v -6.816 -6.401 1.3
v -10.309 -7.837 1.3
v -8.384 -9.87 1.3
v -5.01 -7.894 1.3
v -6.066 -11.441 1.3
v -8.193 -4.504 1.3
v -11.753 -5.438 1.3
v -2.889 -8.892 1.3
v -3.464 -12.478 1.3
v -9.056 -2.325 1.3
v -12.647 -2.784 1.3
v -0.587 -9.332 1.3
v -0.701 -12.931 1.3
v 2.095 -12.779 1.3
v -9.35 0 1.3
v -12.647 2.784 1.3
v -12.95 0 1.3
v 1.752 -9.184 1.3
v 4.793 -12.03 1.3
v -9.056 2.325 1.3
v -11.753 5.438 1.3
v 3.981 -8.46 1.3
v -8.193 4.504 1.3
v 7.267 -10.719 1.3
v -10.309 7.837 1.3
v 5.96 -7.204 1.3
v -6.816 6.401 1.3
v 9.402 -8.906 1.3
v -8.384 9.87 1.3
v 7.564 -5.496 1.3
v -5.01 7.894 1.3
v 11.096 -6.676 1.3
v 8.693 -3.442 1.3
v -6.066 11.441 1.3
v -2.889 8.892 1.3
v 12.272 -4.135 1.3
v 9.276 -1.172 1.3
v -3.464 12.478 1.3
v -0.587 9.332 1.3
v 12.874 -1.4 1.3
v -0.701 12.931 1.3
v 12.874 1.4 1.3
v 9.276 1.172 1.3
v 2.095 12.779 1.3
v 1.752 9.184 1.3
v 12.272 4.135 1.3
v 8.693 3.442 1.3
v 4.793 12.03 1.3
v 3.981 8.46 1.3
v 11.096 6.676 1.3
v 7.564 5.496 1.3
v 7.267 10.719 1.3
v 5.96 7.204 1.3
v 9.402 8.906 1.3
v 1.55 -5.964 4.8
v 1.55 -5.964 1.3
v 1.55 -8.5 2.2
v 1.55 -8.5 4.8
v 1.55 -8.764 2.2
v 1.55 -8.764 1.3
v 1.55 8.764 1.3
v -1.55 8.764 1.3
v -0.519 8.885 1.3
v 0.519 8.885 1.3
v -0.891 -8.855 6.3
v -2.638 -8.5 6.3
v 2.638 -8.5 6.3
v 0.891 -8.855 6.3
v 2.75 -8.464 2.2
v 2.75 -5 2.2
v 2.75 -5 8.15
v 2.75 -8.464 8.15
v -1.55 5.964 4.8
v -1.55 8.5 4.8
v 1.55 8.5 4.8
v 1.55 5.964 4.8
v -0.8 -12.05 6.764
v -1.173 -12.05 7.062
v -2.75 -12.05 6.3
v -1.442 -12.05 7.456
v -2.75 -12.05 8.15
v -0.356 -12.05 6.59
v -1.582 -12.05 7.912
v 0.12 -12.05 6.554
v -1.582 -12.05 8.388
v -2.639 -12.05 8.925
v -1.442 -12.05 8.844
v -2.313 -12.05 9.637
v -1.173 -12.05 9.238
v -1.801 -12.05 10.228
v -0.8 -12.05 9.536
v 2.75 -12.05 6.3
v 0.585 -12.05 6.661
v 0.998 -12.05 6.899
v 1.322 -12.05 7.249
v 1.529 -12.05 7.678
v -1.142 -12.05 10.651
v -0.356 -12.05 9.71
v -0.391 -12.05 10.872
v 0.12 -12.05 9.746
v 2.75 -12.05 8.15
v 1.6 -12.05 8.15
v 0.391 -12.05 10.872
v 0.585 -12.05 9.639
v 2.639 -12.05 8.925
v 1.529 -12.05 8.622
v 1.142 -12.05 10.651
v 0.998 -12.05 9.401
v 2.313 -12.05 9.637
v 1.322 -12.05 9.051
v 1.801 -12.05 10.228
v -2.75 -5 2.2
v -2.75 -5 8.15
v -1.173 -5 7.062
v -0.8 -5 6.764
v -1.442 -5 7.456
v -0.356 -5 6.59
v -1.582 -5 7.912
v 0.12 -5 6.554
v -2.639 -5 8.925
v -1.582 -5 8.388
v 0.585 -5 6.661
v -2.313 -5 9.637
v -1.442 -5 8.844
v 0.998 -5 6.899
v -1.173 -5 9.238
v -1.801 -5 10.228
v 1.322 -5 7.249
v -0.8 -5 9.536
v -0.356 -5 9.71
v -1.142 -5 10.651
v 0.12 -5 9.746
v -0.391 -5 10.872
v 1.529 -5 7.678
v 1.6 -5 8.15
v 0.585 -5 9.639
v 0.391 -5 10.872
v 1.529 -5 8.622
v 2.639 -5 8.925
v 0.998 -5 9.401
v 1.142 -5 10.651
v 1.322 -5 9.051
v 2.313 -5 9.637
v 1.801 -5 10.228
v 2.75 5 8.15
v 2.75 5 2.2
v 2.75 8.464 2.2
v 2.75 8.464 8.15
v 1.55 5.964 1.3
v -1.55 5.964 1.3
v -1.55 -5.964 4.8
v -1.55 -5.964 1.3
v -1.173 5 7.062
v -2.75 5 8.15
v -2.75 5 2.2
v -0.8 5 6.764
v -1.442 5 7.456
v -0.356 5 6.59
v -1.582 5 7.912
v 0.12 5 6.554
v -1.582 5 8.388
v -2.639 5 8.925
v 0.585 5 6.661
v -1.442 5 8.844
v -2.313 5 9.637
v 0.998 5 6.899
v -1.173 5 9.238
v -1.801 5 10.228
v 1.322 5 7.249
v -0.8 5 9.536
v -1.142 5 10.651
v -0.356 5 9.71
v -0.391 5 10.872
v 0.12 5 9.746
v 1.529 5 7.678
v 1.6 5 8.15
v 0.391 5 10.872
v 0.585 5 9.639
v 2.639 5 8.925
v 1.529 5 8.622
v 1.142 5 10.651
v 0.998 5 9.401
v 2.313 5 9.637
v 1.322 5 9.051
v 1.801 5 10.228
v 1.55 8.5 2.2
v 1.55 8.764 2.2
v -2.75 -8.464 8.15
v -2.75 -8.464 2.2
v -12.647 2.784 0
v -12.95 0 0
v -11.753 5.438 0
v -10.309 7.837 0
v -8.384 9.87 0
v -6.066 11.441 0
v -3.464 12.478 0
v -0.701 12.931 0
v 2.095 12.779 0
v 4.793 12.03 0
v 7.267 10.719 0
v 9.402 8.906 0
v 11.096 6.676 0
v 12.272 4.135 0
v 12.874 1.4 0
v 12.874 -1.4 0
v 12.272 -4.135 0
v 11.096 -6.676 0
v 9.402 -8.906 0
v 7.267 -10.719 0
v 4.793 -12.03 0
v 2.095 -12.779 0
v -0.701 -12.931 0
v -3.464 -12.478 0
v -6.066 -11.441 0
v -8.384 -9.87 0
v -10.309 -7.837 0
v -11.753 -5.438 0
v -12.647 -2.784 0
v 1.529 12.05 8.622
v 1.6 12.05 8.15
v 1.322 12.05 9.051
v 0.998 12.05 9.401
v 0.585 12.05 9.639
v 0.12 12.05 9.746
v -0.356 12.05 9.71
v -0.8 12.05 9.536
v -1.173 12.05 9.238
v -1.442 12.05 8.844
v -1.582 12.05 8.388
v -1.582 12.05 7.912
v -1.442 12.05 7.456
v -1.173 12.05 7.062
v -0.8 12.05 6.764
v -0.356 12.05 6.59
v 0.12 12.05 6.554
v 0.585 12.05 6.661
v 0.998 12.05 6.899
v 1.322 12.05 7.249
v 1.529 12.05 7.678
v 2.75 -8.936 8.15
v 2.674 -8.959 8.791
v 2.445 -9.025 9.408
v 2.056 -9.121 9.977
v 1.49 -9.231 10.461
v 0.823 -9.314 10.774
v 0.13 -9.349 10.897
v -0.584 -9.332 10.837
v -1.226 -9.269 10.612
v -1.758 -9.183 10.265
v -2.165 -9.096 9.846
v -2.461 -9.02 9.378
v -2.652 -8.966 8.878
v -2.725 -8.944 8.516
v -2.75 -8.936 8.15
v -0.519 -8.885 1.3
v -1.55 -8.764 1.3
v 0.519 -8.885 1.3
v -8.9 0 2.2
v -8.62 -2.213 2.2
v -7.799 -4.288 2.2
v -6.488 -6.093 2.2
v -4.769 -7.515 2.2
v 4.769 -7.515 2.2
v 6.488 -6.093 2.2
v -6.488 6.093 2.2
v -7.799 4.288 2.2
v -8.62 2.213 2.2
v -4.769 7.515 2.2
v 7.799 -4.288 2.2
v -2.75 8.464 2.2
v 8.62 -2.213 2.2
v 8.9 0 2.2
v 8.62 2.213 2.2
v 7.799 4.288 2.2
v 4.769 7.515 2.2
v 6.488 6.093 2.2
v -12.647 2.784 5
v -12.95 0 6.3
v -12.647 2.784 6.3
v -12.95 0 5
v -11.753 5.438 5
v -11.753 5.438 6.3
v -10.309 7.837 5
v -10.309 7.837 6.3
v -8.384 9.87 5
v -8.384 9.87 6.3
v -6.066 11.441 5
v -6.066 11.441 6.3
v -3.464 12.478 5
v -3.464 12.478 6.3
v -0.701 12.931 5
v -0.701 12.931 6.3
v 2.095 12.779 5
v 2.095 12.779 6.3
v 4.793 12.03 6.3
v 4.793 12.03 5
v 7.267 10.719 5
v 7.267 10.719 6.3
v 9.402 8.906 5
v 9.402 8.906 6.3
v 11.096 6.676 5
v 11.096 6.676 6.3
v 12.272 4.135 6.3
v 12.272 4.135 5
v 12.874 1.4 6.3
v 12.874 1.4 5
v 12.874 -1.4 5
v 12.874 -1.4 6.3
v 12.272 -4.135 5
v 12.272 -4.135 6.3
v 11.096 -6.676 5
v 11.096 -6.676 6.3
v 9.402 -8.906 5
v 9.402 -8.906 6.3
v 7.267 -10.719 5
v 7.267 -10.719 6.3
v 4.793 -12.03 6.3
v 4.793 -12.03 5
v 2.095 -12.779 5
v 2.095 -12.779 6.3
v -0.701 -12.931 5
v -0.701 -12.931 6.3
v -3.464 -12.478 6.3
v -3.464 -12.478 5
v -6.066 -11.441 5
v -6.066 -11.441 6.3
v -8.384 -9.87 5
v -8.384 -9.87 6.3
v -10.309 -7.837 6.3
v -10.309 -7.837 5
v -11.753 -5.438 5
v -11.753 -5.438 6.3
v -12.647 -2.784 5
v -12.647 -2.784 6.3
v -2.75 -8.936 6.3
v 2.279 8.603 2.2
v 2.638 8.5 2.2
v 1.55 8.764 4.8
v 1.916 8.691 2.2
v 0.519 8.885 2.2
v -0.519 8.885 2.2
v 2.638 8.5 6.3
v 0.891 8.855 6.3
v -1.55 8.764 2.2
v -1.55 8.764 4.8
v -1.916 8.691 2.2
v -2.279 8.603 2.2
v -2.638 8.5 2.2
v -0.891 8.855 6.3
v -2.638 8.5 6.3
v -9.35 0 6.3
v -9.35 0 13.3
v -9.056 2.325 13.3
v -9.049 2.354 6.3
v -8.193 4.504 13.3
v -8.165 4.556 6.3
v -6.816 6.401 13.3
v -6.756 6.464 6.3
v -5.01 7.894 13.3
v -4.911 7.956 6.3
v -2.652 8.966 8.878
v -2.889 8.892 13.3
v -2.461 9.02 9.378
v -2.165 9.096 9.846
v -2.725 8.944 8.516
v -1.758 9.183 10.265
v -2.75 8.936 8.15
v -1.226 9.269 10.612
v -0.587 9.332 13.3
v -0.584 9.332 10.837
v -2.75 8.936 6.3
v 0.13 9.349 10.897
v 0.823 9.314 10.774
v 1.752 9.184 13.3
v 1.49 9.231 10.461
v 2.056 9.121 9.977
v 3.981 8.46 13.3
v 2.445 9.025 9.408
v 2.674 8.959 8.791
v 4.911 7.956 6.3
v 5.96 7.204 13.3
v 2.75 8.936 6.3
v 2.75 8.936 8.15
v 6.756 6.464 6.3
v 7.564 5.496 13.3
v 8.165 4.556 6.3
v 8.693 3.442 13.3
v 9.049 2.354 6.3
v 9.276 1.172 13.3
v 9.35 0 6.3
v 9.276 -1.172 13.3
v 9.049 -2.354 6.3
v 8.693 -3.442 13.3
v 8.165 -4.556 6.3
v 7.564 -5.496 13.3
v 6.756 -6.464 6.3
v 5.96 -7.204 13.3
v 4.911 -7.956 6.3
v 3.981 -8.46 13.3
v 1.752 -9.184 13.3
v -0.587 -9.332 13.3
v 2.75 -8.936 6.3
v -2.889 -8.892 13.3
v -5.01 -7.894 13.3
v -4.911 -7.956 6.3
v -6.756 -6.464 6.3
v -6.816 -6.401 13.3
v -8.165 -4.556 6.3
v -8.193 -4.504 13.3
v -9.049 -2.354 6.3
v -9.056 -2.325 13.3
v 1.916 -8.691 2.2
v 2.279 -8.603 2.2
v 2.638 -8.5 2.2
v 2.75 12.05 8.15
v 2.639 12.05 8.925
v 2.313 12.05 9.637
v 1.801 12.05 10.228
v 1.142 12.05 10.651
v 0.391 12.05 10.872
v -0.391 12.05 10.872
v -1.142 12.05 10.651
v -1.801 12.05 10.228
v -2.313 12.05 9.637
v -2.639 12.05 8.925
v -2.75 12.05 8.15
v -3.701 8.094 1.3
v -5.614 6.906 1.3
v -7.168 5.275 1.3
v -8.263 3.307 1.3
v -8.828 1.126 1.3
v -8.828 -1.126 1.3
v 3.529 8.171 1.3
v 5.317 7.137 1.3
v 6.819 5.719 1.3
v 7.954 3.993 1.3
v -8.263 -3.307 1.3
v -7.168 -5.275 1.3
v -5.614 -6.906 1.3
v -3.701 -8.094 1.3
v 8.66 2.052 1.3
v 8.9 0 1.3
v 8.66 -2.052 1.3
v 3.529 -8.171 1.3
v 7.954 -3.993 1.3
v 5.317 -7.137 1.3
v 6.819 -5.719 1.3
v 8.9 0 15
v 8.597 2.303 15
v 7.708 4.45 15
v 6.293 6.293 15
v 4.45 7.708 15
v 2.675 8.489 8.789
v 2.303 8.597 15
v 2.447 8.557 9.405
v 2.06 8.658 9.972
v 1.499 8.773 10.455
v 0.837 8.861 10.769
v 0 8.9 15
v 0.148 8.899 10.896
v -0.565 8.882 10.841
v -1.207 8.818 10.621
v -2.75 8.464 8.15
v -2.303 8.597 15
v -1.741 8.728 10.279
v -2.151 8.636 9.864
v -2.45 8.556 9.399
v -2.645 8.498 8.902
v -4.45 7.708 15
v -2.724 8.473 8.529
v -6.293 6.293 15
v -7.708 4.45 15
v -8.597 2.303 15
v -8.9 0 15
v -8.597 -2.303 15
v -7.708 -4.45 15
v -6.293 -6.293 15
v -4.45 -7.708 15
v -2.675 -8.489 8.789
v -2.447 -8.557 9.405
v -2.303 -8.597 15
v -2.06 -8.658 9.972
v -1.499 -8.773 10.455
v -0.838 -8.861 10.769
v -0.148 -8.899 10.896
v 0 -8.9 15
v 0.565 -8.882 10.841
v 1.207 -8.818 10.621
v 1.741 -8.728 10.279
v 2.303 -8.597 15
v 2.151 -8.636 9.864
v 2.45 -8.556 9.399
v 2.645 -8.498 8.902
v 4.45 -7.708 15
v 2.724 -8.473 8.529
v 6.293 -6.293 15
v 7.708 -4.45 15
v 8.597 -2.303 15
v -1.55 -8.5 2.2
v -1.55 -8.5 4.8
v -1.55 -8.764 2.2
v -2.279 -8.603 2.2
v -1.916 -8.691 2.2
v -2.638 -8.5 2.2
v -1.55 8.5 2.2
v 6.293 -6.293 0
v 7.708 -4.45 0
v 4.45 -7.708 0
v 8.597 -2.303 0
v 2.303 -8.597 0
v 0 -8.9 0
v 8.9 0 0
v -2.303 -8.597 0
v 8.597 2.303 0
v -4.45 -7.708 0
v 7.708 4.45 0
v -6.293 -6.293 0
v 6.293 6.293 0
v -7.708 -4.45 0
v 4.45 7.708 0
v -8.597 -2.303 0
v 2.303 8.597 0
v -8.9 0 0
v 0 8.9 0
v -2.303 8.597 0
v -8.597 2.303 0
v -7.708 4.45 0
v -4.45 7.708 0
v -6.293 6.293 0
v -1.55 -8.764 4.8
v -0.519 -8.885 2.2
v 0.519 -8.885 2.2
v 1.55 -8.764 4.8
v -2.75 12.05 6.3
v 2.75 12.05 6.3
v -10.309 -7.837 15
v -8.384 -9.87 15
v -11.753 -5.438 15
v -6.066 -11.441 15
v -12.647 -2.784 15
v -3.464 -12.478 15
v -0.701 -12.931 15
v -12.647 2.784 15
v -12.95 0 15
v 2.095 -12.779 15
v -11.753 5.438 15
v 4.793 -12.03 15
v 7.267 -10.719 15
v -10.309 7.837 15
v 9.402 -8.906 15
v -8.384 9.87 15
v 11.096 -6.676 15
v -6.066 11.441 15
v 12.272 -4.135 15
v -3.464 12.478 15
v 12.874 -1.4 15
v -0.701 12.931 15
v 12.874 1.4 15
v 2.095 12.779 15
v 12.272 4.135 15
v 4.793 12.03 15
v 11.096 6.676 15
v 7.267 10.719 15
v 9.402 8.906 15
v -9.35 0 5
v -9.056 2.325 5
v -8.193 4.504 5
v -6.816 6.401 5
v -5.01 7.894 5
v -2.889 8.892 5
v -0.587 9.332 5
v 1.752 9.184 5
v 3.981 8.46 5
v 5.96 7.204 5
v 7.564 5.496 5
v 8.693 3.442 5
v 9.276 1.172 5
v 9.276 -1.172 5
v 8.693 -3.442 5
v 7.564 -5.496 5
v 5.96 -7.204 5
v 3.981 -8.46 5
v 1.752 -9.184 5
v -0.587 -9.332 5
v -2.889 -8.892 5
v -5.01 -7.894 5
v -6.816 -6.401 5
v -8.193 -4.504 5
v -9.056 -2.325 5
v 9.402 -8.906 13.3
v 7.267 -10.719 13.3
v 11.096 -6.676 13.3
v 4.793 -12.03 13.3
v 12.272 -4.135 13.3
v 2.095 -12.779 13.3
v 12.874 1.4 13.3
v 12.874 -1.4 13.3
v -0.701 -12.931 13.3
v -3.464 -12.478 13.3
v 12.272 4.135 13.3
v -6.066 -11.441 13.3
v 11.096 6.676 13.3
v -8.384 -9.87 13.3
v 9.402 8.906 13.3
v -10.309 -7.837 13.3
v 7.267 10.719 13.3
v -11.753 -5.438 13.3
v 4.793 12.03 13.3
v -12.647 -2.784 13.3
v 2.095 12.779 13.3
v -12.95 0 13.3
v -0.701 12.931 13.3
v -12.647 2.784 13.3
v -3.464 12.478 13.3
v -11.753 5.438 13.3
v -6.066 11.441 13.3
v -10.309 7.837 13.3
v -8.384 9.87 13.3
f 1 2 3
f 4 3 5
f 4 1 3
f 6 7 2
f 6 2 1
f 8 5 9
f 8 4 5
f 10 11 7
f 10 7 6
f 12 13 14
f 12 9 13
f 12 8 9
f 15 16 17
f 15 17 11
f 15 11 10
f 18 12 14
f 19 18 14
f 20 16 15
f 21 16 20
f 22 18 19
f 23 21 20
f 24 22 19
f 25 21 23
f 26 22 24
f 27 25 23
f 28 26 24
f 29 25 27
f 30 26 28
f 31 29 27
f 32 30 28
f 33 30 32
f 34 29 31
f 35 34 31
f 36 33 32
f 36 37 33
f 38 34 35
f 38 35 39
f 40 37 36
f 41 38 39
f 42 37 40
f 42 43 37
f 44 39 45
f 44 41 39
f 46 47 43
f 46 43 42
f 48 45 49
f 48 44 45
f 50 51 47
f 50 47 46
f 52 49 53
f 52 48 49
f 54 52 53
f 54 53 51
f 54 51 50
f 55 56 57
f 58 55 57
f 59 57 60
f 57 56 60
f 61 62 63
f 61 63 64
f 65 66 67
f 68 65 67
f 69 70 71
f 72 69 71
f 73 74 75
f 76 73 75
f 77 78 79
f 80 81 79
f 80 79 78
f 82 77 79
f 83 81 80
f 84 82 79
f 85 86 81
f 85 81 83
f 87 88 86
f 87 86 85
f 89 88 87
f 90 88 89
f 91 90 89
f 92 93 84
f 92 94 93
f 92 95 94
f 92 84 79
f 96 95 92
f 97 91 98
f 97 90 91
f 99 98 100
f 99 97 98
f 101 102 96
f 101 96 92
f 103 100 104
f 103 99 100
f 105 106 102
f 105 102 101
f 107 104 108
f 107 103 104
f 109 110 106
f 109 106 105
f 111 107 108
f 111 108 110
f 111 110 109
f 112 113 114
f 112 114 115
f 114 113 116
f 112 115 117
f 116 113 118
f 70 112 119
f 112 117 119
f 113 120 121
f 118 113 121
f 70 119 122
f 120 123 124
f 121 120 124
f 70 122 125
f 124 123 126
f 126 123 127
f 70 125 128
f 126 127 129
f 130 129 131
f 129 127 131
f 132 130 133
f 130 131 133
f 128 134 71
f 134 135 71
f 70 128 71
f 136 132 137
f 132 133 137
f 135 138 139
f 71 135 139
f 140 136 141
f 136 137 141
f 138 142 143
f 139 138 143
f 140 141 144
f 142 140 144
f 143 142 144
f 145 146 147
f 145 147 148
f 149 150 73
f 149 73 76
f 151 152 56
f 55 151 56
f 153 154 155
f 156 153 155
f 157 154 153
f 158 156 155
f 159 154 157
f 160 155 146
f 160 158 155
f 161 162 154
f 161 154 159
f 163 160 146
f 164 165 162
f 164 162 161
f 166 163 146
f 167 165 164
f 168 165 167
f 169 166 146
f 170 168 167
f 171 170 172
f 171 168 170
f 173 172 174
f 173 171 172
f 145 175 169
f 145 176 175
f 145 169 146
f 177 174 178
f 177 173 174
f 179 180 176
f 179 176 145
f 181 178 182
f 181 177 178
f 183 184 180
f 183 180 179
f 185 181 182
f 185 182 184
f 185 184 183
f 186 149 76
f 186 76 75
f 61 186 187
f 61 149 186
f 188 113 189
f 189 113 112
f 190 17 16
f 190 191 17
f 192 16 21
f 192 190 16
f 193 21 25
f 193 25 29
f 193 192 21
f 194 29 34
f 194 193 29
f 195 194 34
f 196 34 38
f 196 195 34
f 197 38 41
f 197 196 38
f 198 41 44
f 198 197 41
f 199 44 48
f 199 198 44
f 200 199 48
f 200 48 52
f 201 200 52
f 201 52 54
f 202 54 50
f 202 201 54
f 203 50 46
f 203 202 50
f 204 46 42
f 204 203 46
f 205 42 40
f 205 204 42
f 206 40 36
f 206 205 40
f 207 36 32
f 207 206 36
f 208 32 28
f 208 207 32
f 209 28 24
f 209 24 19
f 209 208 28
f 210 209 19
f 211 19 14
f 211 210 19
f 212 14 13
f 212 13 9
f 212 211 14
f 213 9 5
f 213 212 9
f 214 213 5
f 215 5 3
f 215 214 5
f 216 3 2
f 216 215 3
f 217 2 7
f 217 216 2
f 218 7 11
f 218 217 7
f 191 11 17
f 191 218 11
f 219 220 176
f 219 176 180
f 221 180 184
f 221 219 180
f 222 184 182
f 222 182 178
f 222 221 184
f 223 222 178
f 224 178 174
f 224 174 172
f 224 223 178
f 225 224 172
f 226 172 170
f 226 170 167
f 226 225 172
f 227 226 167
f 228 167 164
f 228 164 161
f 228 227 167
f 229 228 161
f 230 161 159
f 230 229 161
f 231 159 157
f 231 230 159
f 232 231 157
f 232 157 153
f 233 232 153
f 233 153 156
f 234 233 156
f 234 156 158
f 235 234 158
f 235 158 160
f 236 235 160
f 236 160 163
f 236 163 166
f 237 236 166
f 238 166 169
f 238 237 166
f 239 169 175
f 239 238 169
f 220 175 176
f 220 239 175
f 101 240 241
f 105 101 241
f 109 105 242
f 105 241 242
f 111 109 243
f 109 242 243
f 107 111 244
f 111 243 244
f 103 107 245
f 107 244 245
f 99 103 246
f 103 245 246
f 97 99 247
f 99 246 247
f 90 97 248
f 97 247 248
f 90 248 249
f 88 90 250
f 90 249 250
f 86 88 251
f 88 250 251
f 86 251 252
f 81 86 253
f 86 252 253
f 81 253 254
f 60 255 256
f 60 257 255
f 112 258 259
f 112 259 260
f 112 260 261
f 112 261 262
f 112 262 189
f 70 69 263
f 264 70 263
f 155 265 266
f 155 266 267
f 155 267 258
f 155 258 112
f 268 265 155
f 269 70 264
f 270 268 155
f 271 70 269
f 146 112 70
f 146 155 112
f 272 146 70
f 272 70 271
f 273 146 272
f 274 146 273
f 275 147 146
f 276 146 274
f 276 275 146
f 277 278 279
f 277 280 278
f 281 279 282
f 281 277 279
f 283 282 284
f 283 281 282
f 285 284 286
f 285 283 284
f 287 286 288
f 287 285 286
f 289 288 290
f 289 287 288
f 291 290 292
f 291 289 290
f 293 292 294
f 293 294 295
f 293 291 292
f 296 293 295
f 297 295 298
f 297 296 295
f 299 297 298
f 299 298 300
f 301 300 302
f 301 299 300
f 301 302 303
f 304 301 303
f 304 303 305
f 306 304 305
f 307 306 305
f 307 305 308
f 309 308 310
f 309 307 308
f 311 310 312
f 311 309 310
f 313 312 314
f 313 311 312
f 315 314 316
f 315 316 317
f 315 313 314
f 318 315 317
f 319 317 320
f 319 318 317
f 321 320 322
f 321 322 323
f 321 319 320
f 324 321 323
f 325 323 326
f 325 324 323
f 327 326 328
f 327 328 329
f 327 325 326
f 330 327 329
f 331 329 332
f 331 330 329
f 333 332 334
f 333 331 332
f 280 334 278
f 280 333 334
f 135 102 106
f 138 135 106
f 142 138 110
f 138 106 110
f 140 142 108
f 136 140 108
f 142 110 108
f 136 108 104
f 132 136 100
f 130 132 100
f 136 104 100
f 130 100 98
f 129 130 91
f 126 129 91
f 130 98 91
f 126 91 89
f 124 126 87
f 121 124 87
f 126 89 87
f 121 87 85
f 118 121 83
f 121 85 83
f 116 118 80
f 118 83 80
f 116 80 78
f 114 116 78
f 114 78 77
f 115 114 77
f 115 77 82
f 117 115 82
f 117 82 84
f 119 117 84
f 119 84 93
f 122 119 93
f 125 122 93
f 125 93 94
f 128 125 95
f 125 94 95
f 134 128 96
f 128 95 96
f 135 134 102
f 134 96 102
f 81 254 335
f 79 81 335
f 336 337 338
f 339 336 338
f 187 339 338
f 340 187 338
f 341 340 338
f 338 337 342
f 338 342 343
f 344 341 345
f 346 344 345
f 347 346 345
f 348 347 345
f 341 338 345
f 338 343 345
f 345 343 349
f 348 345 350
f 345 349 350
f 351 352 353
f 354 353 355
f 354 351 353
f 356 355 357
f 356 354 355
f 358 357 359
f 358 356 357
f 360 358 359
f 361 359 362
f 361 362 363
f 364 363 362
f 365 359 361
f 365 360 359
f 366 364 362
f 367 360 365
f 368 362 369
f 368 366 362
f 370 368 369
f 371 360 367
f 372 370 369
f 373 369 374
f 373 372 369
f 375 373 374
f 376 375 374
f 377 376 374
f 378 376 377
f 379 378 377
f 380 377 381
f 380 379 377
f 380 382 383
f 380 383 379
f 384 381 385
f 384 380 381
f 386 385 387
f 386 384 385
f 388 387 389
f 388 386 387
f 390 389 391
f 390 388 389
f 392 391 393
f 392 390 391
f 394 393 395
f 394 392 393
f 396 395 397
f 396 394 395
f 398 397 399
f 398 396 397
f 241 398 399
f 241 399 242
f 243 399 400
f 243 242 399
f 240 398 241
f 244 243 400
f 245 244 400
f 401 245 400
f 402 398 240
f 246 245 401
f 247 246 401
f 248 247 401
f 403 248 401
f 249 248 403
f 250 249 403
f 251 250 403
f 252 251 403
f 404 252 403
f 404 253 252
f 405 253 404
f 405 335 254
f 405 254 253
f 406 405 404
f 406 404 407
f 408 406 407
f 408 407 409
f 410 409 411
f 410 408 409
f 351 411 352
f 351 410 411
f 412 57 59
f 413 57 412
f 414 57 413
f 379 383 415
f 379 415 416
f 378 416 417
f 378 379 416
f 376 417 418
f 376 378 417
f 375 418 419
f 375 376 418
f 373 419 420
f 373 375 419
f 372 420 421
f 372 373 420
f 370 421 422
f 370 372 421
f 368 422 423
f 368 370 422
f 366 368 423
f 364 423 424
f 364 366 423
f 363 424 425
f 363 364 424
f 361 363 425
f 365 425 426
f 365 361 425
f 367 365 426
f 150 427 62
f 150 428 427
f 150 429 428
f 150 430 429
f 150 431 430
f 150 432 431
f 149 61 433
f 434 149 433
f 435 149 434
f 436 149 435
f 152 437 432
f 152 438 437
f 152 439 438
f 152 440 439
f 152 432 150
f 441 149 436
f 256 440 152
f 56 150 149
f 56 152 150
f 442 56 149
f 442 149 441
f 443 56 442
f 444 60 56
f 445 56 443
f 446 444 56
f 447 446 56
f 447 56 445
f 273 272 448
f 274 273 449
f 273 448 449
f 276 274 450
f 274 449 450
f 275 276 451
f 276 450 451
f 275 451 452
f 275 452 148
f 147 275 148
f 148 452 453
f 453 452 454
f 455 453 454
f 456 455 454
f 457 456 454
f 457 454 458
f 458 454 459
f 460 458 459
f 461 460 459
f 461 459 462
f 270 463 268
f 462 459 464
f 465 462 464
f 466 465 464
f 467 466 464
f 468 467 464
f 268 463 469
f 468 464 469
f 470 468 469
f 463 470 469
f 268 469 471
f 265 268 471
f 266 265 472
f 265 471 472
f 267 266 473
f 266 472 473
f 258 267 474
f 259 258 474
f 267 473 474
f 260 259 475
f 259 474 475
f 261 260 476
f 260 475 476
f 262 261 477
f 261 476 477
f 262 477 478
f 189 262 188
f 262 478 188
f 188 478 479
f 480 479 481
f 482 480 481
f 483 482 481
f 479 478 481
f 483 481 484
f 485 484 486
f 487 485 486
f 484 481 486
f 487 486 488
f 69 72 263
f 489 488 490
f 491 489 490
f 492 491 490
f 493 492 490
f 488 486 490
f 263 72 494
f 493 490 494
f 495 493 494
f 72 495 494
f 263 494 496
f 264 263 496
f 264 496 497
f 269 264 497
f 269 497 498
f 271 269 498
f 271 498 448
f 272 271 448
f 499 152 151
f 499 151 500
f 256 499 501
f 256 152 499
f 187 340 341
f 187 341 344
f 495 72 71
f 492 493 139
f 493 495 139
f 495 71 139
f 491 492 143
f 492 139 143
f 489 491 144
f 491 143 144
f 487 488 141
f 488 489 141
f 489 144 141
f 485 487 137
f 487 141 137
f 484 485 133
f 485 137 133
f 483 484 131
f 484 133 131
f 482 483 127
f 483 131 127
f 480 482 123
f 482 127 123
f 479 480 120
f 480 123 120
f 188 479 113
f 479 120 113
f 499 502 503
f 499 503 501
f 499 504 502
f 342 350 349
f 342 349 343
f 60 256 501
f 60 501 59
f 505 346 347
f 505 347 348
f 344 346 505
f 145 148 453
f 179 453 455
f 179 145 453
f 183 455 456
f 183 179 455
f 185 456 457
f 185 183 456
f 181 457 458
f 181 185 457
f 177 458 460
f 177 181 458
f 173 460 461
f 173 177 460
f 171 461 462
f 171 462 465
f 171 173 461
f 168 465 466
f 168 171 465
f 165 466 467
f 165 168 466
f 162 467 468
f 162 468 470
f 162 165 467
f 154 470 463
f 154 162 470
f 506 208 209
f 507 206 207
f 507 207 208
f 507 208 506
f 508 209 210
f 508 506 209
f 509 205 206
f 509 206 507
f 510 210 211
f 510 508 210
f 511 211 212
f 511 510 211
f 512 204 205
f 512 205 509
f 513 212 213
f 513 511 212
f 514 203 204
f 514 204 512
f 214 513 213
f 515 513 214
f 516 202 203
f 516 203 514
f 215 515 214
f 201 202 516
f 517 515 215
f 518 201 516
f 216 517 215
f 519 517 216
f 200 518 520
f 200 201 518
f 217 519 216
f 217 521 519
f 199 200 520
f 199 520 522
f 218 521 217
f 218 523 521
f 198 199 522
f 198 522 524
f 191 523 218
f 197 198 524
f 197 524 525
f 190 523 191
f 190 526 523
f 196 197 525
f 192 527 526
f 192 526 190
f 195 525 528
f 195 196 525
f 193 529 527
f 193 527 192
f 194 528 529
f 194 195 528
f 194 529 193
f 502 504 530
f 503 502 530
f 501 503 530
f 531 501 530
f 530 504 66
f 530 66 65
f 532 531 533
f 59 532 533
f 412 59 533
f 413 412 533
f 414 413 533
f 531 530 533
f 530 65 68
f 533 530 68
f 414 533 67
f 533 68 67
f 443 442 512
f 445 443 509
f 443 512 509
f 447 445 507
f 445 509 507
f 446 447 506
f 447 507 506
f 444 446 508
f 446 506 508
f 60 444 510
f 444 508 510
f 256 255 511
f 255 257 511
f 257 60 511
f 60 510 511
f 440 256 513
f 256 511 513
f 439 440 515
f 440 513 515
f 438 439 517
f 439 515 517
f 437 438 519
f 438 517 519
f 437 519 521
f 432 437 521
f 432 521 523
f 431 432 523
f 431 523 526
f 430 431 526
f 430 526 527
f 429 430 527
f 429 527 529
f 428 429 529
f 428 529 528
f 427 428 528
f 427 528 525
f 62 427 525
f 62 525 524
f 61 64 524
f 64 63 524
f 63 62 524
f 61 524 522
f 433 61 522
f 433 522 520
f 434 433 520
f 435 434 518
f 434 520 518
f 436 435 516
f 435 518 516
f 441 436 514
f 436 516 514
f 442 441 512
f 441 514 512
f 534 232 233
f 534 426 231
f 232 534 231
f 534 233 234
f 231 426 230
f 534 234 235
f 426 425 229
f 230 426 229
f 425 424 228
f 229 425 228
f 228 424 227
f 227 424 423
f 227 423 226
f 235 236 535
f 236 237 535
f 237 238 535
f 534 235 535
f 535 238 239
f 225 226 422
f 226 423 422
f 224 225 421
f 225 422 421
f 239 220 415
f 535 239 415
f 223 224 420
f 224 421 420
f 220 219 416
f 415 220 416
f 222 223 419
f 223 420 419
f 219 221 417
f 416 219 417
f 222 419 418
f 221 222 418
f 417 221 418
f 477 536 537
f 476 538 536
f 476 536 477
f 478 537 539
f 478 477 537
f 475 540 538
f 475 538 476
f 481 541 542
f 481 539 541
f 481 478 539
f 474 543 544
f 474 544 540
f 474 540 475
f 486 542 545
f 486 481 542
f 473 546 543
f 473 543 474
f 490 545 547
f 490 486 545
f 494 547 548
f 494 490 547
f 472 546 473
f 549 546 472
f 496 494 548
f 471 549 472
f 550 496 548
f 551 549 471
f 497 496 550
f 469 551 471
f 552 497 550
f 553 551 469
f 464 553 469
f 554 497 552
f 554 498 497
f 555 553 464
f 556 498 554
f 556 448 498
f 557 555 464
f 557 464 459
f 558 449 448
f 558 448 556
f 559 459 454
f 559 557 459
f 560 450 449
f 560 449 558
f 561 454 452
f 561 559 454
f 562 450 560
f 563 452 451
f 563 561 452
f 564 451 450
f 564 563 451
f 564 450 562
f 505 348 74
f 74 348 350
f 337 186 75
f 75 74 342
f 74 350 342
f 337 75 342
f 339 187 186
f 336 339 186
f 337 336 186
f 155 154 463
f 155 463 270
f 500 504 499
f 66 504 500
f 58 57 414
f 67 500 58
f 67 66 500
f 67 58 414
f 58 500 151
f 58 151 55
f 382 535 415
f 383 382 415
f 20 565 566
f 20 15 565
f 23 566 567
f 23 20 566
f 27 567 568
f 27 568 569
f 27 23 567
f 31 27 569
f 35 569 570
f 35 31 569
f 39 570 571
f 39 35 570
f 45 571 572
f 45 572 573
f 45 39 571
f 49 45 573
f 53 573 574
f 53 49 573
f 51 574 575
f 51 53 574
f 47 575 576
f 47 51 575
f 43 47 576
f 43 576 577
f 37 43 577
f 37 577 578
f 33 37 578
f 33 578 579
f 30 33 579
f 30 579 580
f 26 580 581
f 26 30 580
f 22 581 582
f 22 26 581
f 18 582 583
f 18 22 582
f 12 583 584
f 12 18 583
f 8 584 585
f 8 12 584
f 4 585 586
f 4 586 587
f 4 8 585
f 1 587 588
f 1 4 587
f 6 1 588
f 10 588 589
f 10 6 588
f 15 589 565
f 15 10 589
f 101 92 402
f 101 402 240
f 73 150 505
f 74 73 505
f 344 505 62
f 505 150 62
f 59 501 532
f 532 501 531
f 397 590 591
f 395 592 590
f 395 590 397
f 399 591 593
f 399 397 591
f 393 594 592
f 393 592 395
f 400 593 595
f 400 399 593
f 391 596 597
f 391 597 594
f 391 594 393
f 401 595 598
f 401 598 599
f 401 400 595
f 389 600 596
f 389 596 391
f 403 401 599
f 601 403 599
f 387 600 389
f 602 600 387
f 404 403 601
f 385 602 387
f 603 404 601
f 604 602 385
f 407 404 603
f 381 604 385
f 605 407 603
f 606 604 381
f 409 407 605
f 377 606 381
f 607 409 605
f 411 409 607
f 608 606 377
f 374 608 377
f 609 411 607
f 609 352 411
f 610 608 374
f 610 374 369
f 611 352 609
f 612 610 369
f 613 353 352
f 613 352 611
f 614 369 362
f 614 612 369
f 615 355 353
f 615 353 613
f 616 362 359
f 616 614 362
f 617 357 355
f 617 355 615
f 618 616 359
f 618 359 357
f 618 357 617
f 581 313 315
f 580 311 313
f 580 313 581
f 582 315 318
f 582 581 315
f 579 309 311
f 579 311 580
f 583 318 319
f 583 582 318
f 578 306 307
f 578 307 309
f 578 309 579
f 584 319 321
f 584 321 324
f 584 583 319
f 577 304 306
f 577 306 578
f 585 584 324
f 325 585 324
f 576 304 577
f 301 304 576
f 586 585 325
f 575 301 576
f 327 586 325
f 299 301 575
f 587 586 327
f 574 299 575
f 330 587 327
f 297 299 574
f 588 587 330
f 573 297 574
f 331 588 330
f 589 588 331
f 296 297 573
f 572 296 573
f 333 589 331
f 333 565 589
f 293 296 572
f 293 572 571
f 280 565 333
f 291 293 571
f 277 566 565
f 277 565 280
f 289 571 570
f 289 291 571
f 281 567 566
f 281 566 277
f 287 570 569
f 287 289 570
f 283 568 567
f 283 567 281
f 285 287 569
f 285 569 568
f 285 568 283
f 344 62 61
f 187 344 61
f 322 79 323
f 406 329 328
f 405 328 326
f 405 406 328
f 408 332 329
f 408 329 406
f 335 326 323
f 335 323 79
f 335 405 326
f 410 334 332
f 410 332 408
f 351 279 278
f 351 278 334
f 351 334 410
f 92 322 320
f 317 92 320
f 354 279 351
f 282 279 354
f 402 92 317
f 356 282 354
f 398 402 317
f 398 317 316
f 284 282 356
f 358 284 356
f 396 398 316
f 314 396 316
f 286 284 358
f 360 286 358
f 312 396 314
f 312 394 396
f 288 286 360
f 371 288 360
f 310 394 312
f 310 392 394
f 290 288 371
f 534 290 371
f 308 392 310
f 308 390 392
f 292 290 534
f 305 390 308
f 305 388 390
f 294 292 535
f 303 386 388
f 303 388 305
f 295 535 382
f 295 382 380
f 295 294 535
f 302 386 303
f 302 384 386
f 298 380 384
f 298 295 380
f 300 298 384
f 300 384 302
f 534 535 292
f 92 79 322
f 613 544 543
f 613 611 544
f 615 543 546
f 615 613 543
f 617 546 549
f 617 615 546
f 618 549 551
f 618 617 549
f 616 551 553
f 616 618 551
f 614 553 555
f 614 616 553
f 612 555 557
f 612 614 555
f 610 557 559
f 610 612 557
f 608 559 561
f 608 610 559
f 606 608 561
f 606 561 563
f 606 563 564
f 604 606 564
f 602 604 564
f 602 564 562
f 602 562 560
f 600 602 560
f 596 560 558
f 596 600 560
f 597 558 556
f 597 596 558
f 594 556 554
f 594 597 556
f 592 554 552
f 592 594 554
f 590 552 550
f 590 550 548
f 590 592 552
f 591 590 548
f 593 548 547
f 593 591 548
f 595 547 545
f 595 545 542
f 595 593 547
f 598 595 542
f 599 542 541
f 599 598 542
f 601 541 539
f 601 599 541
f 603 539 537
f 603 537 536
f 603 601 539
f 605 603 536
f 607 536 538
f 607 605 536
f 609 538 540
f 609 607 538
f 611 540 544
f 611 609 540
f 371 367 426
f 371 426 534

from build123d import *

# Parameters (mm, degrees)
F2_R      = 8.9
F3_DEPTH  = 1.3
F4_R      = 8.9
F5_DEPTH  = 12.8
F7_START  = 5
F7_DEPTH  = 7.05
F9_START  = 5
F8_W      = 5.5
F8_H      = 1.3
F8_H_2    = 3.7
F9_DEPTH  = 3.5
F10_R     = 1.6
F11_DEPTH = 7.05
F12_W     = 3.1
F12_H     = 2.8
F13_DEPTH = 3.5


# Not quite as in the source:
# - a feature of the source that left no trace in its solid (it failed there, or was rolled back) is left out
# - a pattern or mirror of a feature is missing from the dataset's text; its kind, count and spacing are read off the source's solid


with BuildPart() as f1:
    # F0 (on Front) → F1 (revolve)
    with BuildSketch(Plane.XZ):
        Polygon((-12.95, 0), (0, 0), (0, 15), (-12.95, 15), (-12.95, 13.3), (-9.35, 13.3), (-9.35, 6.3), (-12.95, 6.3), (-12.95, 5), (-9.35, 5), (-9.35, 1.3), (-12.95, 1.3), align=None)
    revolve(axis=Axis((0, 0, 7.5), (0, 0, -1)))

    # F2 (on face) → F3 (cut)
    with BuildSketch(Plane(origin=(0, 0, 0), x_dir=(1, 0, 0), z_dir=(0, 0, -1))):
        Circle(F2_R)
    extrude(amount=-F3_DEPTH, mode=Mode.SUBTRACT)

    # F4 (on face) → F5 (cut)
    with BuildSketch(Plane.XY.offset(15)):
        Circle(F4_R)
    extrude(amount=-F5_DEPTH, mode=Mode.SUBTRACT)

    # F6 (on Front) → F7 (join)
    with BuildSketch(Plane.XZ.offset(F7_START)):
        with BuildLine():
            Line((2.75, 6.3), (2.75, 8.15))
            ThreePointArc((2.75, 8.15), (0, 10.9), (-2.75, 8.15))
            Line((-2.75, 8.15), (-2.75, 6.3))
            Line((-2.75, 6.3), (2.75, 6.3))
        make_face()
    f7 = extrude(amount=F7_DEPTH)

    # F7_copies: F7 across plane
    add(f7.mirror(Plane.ZX))

    # F8 (on Front) → F9 (join)
    with BuildSketch(Plane.XZ.offset(F9_START)):
        with BuildLine():
            ThreePointArc((2.75, 8.15), (0, 10.9), (-2.75, 8.15))
            Line((-2.75, 8.15), (-2.75, 6.3))
            Line((-2.75, 6.3), (2.75, 6.3))
            Line((2.75, 6.3), (2.75, 8.15))
        make_face()
        with Locations((0, 5.65)):
            Rectangle(F8_W, F8_H)
        with Locations((0, 3.15)):
            Rectangle(F8_W, F8_H_2)
    f9 = extrude(amount=F9_DEPTH)

    # F9_copies: F9 across plane
    add(f9.mirror(Plane.ZX))

    # F10 (on face) → F11 (cut, through all)
    with BuildSketch(Plane.XZ.offset(12.05)):
        with Locations((0, 8.15)):
            Circle(F10_R)
    f11 = extrude(amount=-F11_DEPTH, mode=Mode.SUBTRACT)

    # F11_copies: F11 across plane
    add(f11.mirror(Plane.ZX), mode=Mode.SUBTRACT)

    # F12 (on face) → F13 (cut)
    with BuildSketch(Plane(origin=(0, 0, 1.3), x_dir=(1, 0, 0), z_dir=(0, 0, -1))):
        with Locations((0, 7.3639888179)):
            Rectangle(F12_W, F12_H)
    f13 = extrude(amount=-F13_DEPTH, mode=Mode.SUBTRACT)

    # F13_copies: F13 across plane
    add(f13.mirror(Plane.ZX), mode=Mode.SUBTRACT)


solid = f1.part
